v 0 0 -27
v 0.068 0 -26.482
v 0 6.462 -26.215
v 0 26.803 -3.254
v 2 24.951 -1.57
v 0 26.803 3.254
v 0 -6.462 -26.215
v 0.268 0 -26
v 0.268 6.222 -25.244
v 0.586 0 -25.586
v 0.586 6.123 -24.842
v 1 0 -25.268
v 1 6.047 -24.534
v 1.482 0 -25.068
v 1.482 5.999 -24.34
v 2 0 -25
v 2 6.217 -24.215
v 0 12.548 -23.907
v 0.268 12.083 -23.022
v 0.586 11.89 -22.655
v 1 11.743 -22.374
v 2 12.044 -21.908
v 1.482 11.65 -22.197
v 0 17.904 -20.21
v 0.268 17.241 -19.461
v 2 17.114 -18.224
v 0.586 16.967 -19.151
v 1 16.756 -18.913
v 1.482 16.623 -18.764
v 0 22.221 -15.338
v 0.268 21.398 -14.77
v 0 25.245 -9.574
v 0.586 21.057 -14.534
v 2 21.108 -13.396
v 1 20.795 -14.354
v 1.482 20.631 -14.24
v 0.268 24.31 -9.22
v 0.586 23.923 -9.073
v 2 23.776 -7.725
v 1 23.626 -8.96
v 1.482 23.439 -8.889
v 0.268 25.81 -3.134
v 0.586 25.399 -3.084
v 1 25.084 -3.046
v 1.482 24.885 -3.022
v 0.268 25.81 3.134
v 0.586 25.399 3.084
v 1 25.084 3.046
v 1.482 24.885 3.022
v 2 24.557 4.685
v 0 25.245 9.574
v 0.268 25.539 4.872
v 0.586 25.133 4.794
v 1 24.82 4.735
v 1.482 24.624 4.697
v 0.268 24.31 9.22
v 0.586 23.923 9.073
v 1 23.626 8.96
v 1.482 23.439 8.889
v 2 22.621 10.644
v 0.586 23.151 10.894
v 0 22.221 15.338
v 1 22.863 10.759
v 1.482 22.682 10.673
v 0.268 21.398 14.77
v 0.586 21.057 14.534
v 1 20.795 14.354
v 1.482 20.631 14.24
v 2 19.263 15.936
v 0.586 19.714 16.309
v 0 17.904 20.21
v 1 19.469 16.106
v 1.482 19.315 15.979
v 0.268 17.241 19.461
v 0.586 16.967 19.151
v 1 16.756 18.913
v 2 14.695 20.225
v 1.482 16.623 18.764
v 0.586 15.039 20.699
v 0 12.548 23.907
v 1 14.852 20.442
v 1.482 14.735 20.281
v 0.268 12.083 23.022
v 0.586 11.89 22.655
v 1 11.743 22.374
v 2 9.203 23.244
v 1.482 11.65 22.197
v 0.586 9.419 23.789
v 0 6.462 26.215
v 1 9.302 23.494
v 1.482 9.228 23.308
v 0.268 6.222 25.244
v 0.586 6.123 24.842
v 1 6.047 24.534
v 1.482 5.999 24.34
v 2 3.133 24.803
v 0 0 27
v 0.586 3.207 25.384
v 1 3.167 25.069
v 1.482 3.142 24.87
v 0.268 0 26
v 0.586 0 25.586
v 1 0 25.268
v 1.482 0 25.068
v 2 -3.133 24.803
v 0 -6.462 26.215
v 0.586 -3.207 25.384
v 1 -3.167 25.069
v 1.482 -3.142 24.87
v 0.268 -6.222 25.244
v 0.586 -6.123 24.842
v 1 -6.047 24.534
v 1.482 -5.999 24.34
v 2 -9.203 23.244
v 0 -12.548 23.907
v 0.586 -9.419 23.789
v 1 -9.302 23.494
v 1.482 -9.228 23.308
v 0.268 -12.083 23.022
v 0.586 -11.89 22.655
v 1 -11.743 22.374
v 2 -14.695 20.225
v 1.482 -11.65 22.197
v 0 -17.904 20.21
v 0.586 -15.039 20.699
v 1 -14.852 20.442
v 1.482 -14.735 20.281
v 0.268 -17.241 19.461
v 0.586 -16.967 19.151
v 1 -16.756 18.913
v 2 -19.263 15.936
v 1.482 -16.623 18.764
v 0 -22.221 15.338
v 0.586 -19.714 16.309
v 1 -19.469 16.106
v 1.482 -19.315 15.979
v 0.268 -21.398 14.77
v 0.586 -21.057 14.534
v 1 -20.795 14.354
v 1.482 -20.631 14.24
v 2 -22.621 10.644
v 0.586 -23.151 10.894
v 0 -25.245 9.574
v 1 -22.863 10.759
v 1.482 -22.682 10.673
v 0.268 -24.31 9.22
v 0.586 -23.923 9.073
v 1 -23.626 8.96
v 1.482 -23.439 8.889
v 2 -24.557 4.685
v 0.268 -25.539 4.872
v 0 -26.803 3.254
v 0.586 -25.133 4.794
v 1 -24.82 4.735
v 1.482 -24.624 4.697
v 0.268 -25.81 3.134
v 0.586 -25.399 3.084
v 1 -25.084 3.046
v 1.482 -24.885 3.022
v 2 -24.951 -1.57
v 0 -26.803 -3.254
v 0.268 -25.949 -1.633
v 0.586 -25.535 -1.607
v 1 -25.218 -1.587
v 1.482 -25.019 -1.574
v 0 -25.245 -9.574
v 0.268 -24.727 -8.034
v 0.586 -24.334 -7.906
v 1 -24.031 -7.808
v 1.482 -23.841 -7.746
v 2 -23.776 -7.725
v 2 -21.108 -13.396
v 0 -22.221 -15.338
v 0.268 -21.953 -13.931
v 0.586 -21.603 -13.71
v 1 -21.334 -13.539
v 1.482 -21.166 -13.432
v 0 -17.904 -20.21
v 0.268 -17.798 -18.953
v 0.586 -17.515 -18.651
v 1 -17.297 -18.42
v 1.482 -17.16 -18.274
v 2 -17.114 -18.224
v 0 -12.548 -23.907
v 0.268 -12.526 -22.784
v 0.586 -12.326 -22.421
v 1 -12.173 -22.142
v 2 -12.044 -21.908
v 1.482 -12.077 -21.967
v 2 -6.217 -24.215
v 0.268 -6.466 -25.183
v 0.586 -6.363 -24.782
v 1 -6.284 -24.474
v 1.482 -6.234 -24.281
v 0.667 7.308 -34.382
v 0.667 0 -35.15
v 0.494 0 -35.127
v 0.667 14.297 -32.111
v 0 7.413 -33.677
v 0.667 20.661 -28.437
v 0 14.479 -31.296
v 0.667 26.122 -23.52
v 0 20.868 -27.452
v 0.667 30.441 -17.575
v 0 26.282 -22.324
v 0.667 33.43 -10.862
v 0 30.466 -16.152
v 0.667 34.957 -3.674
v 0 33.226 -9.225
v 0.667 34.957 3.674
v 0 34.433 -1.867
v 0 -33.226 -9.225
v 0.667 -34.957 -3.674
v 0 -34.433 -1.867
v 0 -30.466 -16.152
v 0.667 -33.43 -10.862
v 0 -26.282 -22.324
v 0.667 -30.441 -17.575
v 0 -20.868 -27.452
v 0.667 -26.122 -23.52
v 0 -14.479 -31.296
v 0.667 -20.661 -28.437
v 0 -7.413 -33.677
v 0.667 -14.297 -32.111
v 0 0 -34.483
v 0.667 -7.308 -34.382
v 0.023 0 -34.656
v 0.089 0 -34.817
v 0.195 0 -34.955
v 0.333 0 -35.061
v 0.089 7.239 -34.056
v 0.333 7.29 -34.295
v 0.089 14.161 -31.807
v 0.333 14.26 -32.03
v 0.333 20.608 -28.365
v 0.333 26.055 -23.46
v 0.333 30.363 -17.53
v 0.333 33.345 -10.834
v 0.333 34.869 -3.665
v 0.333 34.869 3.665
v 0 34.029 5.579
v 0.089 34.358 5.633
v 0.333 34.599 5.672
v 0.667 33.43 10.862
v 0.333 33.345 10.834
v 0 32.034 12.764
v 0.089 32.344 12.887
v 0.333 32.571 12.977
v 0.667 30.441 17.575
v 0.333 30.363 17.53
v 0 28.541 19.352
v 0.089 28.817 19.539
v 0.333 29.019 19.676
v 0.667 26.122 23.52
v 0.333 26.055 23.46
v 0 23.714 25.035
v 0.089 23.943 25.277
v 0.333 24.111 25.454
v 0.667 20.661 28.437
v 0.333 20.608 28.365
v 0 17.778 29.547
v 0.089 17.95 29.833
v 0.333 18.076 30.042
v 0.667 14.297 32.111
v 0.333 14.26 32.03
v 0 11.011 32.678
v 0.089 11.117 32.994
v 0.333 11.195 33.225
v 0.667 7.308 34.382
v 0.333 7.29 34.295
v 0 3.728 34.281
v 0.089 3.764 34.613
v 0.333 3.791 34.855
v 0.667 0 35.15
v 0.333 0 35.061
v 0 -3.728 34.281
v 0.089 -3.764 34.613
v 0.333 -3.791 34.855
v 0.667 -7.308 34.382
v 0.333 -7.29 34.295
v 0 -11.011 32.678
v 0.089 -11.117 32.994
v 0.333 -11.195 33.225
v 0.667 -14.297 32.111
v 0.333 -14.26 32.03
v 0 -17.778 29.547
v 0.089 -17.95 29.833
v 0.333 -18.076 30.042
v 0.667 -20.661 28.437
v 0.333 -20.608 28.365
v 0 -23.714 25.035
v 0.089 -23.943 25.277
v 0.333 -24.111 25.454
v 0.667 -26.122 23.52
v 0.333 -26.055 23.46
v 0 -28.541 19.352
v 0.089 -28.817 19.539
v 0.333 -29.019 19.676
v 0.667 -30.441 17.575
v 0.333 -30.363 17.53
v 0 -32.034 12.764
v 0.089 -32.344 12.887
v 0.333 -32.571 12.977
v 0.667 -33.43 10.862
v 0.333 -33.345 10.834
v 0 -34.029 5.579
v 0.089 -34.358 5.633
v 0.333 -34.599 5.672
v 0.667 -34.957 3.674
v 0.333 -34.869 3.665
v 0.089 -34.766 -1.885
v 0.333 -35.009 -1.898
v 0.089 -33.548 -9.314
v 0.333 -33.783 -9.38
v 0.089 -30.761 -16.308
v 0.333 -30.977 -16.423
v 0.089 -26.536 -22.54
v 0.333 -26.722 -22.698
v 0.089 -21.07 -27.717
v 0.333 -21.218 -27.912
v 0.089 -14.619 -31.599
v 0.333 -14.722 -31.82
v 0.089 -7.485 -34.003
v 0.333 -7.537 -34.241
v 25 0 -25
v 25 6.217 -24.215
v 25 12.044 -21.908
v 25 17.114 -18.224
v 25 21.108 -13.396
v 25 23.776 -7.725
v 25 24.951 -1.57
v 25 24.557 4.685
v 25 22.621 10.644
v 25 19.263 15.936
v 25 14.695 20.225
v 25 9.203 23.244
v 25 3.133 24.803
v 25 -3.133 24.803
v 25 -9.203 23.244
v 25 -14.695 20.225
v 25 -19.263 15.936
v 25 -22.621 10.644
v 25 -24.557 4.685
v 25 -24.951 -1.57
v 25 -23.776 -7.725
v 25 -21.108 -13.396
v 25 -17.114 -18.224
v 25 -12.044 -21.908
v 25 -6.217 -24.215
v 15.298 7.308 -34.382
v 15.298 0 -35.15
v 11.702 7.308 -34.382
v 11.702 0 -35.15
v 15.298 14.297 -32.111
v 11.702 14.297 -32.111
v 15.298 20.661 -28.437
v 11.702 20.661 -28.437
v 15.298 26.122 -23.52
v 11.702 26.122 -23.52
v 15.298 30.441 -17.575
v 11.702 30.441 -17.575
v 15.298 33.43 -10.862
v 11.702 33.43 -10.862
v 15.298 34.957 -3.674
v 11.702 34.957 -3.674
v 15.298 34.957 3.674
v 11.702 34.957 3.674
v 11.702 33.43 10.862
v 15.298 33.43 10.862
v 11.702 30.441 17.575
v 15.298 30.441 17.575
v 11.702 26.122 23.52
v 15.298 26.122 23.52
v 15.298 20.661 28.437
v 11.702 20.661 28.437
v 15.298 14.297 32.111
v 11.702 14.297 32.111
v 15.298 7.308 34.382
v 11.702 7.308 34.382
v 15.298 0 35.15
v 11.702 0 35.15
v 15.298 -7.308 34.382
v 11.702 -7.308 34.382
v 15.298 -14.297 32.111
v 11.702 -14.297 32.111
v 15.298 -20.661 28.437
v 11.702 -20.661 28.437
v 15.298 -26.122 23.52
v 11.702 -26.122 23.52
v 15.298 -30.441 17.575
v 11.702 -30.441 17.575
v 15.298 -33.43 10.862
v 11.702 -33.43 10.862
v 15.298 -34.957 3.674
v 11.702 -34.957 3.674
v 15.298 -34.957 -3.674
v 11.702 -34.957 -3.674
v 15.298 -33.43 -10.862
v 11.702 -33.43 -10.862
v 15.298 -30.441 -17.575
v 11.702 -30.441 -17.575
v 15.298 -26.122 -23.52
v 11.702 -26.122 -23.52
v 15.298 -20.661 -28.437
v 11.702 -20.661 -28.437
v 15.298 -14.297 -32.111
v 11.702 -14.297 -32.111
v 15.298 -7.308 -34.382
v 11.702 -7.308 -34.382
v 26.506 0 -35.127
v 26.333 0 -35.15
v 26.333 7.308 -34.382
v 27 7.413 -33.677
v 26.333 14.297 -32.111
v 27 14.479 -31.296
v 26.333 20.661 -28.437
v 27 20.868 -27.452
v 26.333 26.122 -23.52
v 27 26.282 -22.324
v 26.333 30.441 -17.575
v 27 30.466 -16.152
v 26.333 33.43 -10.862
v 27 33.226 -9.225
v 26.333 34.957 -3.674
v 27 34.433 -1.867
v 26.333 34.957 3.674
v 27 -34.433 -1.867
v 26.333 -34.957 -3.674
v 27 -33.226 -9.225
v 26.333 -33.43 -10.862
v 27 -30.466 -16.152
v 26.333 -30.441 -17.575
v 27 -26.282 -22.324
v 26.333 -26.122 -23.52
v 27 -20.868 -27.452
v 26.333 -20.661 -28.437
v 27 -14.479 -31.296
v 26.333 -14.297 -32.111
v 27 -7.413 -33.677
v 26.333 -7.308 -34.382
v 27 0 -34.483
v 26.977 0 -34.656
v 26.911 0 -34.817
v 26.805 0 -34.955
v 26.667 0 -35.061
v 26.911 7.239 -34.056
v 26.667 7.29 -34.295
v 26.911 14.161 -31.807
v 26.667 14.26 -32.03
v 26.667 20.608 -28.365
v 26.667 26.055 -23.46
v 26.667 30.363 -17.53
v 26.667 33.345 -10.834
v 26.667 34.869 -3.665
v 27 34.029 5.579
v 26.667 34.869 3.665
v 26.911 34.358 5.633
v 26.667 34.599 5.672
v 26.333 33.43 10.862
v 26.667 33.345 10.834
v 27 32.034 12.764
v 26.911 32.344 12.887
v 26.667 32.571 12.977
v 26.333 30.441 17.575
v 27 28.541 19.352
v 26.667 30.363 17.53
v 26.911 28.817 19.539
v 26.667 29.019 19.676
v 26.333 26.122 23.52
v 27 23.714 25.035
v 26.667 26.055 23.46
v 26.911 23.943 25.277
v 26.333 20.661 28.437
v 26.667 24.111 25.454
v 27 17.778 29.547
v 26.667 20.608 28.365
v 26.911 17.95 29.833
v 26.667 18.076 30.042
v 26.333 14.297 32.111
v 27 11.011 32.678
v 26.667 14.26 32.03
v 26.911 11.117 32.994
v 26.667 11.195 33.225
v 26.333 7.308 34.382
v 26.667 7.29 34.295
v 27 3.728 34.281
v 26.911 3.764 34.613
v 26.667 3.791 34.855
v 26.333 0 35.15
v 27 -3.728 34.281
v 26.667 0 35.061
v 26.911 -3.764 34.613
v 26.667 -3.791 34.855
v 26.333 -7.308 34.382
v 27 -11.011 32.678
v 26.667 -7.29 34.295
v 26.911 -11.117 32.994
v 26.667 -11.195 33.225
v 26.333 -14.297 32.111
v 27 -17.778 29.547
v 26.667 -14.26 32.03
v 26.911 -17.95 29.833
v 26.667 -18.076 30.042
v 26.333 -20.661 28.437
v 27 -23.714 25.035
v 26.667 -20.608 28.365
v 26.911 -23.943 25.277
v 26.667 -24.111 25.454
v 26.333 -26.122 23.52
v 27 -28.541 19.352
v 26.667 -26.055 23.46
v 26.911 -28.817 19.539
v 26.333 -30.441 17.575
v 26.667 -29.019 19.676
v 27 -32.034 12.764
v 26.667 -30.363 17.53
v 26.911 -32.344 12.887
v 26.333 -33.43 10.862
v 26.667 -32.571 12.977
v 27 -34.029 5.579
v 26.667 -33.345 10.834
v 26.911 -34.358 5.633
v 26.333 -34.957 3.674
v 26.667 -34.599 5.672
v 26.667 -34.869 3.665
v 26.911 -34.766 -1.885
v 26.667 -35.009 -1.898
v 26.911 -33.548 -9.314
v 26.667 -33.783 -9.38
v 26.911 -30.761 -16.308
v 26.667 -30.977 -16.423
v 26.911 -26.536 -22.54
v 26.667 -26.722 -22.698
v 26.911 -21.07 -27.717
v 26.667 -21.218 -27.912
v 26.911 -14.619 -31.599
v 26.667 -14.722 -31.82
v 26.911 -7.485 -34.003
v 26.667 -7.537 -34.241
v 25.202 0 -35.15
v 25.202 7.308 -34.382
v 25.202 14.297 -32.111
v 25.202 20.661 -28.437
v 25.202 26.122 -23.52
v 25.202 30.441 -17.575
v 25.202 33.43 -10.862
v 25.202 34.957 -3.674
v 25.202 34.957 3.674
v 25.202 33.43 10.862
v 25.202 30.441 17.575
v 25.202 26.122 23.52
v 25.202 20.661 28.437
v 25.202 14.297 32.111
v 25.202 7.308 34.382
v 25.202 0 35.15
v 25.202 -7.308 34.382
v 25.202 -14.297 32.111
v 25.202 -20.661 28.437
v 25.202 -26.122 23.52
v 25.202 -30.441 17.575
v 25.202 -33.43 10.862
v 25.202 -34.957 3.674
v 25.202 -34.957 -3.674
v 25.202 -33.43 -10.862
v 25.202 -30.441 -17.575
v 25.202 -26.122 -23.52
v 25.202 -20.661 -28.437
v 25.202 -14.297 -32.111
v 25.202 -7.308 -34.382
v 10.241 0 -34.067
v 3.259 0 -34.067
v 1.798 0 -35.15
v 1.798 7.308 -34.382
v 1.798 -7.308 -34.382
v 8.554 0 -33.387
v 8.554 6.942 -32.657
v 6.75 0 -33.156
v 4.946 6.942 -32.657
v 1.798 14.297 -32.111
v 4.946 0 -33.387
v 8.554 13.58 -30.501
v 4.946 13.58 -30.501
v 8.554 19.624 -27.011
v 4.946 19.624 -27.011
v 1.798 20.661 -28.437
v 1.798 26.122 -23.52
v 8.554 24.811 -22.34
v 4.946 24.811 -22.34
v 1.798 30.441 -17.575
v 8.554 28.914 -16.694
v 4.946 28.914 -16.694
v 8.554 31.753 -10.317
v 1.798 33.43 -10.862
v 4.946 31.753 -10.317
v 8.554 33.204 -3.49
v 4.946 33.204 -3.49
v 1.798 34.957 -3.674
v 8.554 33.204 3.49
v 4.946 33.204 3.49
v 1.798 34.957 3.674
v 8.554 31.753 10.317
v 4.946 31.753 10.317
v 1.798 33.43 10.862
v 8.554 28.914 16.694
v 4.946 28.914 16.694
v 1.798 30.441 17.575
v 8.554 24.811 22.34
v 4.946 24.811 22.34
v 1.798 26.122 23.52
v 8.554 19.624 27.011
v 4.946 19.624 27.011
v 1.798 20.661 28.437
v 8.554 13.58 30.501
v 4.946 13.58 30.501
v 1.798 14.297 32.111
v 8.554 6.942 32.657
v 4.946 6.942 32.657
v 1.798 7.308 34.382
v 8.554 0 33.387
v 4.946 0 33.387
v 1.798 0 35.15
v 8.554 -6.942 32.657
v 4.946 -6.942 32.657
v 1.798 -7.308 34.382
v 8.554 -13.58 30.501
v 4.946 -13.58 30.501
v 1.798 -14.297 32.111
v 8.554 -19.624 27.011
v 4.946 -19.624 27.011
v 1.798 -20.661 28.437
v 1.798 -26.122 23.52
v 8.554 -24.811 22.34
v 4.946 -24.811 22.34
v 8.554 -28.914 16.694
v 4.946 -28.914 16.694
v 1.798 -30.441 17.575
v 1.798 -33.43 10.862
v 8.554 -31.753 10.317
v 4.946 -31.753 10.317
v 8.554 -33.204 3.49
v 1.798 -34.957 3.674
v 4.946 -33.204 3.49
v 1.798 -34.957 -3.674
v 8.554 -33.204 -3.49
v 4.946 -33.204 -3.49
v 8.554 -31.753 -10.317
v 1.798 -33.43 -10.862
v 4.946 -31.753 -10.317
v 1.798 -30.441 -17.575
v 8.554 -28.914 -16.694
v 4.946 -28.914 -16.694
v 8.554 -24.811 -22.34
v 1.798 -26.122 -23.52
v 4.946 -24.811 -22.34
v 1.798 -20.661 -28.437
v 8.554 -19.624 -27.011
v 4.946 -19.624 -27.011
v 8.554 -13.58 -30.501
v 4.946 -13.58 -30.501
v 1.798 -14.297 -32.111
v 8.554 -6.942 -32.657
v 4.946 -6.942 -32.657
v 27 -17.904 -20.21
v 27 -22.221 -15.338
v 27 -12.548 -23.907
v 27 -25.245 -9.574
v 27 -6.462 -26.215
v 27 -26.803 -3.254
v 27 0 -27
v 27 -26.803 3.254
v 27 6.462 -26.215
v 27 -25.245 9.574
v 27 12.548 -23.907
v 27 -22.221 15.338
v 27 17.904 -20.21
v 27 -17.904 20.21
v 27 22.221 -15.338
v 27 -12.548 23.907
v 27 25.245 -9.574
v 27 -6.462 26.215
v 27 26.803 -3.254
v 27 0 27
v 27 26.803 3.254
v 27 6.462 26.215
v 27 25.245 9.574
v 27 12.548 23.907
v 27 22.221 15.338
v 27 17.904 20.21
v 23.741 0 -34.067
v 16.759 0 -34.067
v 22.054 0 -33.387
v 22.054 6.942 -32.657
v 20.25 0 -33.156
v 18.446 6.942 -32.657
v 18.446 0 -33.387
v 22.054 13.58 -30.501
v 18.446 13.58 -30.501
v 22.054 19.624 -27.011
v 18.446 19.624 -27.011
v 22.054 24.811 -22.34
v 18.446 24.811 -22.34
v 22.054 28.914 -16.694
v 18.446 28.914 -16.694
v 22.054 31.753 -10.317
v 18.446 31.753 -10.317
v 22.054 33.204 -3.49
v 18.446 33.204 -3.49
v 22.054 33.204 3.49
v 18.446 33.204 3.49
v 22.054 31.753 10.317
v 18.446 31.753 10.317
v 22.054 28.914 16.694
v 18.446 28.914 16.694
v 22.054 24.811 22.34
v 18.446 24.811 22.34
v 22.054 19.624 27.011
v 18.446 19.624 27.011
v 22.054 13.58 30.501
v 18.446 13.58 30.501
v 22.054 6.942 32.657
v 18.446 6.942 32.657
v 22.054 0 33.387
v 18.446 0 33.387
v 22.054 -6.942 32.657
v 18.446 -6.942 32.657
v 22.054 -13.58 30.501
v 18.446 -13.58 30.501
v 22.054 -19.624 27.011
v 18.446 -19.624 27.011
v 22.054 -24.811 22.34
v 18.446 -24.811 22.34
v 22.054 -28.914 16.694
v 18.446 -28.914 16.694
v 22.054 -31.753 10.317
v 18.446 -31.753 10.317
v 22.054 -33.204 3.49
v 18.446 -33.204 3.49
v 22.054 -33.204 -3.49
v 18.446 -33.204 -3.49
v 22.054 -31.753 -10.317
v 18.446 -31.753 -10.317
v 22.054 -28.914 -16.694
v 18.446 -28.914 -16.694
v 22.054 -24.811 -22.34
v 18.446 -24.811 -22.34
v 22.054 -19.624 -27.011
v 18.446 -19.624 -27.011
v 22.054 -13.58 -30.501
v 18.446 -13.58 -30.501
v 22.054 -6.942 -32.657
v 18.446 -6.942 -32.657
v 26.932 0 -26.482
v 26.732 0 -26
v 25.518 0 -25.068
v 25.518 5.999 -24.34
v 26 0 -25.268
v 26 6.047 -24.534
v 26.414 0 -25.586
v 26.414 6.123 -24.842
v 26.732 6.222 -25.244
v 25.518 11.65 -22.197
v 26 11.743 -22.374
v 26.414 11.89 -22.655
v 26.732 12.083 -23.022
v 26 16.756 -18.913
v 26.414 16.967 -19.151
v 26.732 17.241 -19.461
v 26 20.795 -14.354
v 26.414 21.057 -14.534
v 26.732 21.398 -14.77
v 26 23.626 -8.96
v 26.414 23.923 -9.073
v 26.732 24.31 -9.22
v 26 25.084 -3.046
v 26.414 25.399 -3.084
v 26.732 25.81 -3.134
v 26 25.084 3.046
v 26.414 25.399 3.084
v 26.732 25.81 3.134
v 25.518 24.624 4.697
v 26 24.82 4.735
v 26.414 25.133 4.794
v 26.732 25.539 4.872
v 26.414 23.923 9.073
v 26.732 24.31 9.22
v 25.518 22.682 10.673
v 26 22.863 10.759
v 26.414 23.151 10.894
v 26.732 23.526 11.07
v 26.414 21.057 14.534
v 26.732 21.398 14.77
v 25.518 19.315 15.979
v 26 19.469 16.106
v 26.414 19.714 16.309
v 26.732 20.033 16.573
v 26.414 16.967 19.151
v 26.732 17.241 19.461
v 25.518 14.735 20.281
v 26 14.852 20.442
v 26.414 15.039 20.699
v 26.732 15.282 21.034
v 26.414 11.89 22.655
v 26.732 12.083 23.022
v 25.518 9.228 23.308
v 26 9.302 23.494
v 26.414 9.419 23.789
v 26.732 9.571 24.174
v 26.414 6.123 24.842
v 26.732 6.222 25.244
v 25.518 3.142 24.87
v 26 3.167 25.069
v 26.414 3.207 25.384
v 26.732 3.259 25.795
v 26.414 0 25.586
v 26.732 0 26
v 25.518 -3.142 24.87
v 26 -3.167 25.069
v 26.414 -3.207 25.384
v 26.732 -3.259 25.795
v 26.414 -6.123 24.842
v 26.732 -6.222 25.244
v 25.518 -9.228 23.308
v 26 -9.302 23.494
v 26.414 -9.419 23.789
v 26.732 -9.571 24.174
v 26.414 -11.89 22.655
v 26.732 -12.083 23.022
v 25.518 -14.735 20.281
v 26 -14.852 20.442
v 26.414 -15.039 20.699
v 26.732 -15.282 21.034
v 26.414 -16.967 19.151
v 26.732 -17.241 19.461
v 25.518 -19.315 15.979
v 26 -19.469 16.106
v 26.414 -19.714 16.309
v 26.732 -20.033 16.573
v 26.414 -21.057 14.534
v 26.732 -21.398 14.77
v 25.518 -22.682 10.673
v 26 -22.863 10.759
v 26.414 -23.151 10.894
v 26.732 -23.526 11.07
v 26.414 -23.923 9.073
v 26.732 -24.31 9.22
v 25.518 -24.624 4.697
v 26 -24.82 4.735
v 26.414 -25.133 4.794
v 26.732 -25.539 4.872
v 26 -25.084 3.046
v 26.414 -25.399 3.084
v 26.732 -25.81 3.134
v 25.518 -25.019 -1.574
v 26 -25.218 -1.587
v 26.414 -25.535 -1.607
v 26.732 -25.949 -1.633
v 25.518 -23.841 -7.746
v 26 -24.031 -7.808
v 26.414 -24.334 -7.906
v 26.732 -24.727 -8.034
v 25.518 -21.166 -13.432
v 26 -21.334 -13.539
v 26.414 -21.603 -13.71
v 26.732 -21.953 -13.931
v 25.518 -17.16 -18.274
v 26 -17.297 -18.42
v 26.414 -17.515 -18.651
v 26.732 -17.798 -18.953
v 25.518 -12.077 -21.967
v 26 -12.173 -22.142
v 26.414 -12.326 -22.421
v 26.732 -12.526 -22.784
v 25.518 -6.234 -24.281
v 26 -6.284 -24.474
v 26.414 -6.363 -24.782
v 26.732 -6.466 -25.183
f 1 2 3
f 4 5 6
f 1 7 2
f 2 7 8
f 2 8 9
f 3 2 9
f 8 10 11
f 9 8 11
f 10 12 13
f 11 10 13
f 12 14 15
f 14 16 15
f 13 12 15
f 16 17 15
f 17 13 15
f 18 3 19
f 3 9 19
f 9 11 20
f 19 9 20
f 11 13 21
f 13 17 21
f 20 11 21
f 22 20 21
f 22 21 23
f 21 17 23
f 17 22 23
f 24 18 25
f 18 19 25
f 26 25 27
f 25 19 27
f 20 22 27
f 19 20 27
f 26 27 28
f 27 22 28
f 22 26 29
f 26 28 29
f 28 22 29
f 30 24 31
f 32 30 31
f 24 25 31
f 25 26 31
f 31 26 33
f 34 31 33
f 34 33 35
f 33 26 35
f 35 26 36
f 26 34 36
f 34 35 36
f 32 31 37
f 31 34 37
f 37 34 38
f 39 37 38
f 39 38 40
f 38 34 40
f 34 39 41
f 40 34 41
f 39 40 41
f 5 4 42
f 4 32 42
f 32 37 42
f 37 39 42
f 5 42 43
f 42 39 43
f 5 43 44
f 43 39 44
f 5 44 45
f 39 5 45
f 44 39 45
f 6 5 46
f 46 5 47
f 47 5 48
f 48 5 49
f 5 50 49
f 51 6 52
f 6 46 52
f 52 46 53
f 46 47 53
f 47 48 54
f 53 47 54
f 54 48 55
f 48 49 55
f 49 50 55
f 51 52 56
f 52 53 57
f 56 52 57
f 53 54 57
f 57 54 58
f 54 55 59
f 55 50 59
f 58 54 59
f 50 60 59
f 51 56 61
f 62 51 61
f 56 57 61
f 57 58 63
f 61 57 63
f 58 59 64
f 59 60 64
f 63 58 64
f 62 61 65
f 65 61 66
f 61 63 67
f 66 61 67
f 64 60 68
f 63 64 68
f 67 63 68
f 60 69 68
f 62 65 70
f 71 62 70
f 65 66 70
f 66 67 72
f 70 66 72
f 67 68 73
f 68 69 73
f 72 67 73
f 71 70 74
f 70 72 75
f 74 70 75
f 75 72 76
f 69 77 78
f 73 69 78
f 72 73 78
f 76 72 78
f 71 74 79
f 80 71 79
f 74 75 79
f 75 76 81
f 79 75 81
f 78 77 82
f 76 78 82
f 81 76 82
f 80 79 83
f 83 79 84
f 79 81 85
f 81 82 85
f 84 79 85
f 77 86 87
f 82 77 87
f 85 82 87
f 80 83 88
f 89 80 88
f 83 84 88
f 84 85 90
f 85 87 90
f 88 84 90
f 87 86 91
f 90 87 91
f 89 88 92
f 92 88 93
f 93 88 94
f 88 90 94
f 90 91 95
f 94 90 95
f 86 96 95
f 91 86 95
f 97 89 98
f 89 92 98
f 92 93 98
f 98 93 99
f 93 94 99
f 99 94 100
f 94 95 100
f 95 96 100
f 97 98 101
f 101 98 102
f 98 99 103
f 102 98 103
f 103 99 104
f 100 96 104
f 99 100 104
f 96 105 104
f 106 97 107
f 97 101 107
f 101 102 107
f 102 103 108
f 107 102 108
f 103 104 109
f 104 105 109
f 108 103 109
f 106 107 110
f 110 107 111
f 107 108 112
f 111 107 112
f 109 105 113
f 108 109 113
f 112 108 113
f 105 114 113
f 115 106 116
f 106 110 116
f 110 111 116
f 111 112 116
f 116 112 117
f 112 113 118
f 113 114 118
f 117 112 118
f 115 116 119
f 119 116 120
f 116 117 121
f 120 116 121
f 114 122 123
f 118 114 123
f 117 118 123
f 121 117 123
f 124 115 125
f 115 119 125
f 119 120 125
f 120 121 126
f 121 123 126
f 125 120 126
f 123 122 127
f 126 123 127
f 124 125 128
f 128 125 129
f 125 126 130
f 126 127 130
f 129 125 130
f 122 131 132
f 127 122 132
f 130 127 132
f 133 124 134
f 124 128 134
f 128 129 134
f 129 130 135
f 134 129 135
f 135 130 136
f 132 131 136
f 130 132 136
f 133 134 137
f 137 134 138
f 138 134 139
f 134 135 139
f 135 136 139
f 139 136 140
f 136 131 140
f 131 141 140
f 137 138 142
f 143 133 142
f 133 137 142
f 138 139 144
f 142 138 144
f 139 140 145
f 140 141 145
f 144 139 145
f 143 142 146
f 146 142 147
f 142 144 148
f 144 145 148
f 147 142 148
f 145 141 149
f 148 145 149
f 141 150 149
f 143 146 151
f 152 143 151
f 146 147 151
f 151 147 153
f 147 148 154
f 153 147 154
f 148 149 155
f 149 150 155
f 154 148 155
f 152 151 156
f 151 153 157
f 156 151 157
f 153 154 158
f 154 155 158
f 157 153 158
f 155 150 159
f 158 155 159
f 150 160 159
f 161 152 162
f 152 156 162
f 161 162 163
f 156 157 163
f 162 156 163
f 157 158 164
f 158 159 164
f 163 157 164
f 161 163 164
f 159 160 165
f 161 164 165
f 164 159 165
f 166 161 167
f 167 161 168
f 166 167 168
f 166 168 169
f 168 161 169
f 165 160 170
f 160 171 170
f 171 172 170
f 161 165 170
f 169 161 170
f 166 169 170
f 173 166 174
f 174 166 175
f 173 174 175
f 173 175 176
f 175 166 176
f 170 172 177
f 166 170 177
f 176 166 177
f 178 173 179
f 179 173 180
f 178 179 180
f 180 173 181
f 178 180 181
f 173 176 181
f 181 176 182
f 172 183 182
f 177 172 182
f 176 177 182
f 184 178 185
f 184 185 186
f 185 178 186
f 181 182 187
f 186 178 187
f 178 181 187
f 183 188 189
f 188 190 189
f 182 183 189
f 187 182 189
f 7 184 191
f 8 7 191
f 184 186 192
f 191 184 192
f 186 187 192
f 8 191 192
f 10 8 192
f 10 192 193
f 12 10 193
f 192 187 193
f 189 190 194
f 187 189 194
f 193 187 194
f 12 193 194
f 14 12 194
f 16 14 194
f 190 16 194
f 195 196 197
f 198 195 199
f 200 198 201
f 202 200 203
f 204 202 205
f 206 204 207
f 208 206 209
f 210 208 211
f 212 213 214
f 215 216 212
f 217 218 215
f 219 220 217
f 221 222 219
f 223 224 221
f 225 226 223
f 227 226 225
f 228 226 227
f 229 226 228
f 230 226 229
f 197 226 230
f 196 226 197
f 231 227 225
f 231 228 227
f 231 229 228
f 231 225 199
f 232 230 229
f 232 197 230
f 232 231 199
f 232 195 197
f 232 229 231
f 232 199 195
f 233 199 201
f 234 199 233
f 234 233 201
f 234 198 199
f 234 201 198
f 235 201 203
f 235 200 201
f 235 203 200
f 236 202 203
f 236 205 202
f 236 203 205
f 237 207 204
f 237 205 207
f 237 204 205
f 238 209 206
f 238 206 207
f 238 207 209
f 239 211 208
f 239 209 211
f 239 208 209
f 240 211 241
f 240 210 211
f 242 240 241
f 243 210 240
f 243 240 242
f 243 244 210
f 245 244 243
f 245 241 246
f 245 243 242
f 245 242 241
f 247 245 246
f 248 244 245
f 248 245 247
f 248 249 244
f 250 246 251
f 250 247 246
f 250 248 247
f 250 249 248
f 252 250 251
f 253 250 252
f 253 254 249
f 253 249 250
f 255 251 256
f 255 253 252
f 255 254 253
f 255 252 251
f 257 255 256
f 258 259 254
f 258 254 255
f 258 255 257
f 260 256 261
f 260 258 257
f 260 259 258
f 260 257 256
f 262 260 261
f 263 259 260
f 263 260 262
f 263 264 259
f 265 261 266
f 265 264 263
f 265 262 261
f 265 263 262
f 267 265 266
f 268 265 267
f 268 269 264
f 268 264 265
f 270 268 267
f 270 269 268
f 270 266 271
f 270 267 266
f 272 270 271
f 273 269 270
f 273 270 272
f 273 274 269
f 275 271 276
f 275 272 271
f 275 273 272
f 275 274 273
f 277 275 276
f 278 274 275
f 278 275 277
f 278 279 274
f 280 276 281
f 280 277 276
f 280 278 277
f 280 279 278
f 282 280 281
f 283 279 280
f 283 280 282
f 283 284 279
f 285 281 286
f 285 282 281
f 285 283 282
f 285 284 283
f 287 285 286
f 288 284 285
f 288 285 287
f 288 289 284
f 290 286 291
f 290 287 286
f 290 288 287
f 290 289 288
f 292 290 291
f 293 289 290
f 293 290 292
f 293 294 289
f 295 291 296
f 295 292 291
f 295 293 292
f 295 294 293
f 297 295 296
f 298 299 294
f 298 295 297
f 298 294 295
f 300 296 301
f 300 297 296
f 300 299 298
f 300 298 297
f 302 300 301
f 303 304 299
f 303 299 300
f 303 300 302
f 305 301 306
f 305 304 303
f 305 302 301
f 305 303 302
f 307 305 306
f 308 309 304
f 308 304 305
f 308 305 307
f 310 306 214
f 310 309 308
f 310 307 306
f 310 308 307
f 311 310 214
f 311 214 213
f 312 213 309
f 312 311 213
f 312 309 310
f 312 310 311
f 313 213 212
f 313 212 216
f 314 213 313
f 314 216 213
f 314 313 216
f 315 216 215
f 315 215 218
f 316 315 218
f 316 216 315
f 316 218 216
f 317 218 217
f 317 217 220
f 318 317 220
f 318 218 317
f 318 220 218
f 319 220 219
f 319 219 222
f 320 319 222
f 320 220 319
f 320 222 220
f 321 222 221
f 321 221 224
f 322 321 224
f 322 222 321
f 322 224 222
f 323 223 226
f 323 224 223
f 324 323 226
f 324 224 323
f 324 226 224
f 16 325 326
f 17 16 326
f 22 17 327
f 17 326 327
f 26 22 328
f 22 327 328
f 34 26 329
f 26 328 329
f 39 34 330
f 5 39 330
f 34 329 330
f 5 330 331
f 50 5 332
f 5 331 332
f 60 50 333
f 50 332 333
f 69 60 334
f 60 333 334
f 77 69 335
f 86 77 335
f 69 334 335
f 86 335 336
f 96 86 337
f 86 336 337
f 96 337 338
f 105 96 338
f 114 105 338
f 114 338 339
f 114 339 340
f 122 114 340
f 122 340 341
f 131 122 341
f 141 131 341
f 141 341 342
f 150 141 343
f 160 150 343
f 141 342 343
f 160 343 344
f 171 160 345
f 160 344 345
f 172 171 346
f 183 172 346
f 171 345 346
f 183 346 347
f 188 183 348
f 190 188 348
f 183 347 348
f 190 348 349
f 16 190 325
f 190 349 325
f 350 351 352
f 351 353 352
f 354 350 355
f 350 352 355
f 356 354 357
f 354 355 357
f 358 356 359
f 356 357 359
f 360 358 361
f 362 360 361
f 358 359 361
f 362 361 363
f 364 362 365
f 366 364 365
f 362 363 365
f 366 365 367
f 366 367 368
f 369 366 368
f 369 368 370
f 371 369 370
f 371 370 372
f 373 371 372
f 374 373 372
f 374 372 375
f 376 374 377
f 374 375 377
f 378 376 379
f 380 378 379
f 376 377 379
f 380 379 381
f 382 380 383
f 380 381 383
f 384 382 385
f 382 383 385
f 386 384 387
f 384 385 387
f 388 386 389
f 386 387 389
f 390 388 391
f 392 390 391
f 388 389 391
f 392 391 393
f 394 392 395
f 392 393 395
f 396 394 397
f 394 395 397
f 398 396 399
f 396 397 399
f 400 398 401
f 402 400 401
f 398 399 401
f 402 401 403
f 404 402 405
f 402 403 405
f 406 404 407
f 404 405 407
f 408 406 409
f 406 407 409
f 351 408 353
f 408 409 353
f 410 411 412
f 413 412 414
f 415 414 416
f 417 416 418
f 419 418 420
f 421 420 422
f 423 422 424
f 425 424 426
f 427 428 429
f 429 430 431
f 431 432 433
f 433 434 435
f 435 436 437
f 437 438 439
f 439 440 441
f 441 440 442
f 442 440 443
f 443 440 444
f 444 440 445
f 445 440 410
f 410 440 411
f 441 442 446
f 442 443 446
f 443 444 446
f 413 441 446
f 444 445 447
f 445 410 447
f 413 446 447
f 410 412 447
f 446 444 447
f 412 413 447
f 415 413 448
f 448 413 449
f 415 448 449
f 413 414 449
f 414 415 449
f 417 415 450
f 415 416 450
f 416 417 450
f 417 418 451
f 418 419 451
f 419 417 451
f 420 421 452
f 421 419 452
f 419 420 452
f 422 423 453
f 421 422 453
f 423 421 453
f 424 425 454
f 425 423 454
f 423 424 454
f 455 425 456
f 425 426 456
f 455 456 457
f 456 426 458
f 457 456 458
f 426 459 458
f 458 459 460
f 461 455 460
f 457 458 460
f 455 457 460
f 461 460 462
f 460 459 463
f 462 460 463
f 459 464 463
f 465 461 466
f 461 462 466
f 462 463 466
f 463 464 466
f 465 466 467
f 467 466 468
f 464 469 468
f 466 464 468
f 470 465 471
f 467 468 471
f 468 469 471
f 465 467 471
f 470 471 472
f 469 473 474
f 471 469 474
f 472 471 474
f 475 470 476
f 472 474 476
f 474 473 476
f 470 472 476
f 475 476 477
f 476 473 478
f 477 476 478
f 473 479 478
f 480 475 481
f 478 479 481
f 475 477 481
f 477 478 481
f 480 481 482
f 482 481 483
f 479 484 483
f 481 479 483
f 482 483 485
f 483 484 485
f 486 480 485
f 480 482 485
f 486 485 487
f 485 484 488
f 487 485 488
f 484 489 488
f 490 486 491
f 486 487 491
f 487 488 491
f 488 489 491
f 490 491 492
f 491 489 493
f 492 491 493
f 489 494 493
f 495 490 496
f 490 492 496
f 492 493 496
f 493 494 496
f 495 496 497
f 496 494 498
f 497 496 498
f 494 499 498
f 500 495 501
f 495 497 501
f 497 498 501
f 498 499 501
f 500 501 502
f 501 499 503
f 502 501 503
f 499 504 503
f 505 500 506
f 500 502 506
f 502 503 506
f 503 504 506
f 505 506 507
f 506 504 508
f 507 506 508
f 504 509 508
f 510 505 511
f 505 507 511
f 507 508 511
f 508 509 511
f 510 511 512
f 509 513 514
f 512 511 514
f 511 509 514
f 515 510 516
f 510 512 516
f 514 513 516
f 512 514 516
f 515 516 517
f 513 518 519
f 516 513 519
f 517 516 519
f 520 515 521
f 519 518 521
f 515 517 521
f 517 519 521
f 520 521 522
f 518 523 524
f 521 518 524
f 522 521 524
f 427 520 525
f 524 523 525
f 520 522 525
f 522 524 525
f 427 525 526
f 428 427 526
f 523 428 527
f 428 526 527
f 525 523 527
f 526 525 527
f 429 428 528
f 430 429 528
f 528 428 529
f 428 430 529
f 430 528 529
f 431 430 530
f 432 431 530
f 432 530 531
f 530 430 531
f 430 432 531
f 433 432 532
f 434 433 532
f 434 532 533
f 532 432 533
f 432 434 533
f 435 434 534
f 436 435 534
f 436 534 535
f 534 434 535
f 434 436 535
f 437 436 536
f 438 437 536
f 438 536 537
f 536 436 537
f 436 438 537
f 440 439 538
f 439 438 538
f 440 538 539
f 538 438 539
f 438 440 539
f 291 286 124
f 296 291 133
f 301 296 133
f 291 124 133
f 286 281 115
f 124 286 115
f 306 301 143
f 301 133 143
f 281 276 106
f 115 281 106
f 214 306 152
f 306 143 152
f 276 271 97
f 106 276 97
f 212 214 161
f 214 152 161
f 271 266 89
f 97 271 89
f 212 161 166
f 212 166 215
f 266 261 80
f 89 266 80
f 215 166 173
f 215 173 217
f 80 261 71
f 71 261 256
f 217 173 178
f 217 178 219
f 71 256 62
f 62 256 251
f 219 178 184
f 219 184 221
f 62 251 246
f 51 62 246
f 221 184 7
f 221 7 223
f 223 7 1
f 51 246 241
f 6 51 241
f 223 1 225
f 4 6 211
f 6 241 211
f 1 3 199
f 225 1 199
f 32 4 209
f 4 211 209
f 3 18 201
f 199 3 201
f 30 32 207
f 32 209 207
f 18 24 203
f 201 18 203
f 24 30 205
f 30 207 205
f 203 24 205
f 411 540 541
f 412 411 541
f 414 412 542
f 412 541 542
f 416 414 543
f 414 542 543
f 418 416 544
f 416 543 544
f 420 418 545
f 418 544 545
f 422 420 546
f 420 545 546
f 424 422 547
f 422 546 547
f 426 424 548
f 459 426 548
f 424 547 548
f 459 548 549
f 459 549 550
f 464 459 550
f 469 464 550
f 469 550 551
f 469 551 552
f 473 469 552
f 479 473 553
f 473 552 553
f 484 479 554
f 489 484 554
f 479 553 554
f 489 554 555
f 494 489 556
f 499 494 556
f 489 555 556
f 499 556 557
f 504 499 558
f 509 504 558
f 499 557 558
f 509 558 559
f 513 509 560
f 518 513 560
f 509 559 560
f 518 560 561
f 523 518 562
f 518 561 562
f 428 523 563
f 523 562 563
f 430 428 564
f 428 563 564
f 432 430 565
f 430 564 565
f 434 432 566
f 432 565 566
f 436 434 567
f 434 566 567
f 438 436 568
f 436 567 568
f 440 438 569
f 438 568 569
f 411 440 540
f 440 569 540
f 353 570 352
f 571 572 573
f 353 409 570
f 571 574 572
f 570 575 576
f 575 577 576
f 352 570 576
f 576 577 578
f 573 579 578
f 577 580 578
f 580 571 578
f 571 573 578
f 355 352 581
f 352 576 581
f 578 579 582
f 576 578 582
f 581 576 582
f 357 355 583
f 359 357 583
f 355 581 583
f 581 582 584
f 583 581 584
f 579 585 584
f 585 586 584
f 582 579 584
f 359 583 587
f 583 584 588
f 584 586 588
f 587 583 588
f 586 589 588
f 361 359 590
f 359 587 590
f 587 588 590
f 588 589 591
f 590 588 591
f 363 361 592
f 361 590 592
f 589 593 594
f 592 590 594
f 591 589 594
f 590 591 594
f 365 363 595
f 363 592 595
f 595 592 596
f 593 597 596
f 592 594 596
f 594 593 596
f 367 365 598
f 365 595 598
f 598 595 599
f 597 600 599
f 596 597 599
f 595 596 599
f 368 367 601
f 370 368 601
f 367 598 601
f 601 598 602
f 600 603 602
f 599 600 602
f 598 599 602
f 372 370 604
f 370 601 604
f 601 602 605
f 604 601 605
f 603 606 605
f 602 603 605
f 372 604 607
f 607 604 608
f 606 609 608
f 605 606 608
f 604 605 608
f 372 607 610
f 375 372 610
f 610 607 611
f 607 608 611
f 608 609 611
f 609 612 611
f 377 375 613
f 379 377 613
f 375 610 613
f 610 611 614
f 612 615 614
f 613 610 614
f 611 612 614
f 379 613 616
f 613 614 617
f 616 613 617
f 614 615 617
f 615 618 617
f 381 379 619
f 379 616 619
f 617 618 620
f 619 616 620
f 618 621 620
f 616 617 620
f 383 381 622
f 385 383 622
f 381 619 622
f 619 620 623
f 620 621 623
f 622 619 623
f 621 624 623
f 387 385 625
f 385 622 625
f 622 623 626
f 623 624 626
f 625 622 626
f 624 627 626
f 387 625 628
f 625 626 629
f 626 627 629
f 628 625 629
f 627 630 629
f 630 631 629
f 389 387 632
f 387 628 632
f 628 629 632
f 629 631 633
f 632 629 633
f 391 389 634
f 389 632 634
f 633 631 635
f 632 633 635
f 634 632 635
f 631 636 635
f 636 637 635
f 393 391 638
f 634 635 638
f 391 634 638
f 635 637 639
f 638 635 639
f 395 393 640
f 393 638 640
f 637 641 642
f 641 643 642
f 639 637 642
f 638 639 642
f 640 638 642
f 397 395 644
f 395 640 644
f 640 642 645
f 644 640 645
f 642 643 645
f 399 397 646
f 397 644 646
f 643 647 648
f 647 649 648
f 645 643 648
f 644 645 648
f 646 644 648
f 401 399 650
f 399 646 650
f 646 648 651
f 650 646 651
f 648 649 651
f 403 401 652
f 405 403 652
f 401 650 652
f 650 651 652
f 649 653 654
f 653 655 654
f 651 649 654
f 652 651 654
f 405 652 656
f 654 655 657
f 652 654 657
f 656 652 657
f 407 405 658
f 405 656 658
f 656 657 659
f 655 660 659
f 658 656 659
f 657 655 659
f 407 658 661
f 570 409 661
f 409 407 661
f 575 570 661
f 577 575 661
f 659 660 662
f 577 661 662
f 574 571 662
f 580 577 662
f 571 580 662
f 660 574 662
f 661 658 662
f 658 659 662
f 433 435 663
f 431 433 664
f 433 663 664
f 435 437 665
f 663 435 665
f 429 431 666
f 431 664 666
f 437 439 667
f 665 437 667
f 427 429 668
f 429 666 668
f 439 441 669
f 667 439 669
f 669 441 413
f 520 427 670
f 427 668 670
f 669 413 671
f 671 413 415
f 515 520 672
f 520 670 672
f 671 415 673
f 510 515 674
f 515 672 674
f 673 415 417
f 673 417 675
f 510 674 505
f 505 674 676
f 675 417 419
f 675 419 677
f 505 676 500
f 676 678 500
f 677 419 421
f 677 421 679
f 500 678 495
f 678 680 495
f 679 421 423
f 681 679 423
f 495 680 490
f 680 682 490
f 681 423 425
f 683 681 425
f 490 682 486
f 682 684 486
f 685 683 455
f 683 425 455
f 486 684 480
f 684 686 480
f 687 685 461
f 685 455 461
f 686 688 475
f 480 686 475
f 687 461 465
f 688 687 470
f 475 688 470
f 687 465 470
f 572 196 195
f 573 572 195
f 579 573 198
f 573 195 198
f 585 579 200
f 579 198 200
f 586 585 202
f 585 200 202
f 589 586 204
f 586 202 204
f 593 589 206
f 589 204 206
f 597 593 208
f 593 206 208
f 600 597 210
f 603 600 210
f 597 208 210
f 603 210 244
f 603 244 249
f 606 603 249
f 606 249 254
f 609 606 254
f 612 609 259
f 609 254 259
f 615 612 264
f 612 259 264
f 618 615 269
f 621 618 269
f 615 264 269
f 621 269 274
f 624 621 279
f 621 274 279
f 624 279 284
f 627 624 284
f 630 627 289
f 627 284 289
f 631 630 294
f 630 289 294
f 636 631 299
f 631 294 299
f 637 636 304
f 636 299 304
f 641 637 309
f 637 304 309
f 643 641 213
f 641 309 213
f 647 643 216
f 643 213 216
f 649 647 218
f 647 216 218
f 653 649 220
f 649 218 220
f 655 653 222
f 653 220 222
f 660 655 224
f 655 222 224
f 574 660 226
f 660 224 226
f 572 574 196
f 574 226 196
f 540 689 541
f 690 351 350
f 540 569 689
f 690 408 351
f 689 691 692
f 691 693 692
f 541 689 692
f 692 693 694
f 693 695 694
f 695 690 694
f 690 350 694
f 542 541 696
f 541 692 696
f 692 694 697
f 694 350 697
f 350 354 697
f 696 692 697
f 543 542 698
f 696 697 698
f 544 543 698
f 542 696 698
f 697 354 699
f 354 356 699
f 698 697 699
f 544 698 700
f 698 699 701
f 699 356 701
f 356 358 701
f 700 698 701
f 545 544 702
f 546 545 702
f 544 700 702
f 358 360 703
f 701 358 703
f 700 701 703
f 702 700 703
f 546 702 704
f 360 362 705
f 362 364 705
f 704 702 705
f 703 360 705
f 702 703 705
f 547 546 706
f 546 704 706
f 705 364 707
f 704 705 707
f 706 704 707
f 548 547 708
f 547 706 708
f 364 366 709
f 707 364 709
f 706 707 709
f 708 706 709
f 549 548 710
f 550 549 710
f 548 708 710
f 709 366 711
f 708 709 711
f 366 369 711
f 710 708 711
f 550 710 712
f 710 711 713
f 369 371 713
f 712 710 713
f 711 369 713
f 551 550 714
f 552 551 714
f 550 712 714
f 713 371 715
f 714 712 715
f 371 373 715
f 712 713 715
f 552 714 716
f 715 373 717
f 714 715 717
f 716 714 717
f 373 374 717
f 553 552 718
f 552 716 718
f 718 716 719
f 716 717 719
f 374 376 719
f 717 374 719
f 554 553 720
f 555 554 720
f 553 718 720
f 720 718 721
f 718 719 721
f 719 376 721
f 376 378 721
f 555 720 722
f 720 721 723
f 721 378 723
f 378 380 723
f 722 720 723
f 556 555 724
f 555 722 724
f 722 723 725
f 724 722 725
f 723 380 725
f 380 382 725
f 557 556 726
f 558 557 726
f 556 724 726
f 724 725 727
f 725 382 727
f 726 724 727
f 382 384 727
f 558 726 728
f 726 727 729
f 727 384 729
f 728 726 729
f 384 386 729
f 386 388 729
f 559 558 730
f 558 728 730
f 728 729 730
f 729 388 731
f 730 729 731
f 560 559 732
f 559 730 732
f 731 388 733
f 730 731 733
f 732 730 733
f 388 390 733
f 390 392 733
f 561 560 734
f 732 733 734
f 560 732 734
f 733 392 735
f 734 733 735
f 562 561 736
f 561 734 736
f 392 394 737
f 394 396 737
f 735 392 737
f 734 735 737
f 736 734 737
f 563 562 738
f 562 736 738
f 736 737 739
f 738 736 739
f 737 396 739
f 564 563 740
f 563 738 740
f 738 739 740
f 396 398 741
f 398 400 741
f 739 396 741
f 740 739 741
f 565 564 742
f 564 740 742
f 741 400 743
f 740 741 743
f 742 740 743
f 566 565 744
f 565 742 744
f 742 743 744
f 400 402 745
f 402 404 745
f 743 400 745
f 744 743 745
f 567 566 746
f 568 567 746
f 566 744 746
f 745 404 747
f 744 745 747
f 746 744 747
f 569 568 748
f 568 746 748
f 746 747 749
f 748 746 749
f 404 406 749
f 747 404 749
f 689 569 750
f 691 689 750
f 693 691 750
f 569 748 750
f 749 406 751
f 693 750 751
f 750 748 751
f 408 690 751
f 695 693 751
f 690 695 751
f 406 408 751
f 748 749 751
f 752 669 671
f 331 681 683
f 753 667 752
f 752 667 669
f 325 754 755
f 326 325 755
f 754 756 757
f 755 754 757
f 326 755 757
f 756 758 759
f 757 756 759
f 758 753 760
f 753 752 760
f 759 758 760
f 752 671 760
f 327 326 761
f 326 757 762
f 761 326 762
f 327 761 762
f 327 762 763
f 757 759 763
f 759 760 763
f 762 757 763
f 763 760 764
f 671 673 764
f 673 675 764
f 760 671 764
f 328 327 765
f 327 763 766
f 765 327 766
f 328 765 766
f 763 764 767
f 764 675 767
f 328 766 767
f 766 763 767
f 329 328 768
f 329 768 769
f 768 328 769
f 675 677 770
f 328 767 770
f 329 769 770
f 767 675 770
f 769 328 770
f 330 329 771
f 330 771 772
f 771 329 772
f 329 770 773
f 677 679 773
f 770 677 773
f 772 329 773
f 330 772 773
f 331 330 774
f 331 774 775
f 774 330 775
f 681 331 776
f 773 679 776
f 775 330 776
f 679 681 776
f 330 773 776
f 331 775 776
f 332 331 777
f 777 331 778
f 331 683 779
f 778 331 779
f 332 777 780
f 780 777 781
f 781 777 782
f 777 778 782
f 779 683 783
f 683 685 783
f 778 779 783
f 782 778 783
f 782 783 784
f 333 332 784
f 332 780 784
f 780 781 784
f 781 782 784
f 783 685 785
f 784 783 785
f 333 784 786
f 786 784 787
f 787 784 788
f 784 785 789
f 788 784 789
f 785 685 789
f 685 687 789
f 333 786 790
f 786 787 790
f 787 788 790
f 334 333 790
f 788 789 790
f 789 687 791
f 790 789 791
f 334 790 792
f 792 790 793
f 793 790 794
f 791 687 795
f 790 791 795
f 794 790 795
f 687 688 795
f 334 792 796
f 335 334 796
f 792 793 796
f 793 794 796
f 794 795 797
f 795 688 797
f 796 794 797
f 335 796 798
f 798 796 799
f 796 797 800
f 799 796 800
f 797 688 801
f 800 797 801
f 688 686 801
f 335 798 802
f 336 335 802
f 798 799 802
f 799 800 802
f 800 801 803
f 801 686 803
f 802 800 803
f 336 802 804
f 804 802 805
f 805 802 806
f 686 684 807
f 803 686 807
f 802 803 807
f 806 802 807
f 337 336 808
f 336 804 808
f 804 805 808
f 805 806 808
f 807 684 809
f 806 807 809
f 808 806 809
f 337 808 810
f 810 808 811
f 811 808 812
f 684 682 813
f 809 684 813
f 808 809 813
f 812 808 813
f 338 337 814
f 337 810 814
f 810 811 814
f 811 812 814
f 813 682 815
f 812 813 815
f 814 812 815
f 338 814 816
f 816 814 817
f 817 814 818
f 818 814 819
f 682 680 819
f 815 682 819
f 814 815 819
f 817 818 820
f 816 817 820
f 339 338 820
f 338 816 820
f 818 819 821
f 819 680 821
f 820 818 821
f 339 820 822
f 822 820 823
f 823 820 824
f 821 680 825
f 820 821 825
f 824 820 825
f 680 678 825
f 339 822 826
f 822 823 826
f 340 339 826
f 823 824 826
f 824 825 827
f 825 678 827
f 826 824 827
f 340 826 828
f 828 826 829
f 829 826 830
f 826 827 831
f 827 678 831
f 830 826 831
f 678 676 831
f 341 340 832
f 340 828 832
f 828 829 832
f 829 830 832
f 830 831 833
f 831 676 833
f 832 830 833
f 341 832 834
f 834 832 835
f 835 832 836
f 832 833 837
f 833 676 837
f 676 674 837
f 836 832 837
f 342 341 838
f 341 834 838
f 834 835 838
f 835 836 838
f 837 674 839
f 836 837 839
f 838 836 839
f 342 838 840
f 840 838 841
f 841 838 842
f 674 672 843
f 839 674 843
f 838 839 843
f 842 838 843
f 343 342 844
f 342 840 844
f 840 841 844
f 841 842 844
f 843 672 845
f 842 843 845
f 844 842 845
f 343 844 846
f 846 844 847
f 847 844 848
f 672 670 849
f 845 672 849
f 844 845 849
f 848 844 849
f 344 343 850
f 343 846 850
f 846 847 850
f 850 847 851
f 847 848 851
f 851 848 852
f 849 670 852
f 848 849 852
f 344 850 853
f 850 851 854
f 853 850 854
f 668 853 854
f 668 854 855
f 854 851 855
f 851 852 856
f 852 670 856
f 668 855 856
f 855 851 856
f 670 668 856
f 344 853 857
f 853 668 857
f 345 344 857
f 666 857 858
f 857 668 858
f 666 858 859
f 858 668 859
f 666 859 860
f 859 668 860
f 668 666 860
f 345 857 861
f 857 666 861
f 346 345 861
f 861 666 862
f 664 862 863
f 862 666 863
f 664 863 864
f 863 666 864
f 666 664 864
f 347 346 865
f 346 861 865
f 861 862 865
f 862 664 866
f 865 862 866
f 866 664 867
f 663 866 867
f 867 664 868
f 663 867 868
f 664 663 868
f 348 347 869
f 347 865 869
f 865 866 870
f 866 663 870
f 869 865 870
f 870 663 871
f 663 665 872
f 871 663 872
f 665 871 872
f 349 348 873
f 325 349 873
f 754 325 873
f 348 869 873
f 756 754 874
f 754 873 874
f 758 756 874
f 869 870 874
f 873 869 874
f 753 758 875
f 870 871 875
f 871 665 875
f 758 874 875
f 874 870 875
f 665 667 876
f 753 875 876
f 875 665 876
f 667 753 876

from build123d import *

# Parameters (mm, degrees)
FILLET1_R = 2
FILLET2_R = 0.666666667


with BuildPart() as part:
    # Sketch1 → Revolve1 (revolve)
    with BuildSketch(Plane.XY, mode=Mode.PRIVATE) as revolve1_sk:
        with BuildLine():
            Line((1.798294662, 35.15), (0, 35.15))
            Line((0, 35.15), (0, 25))
            Line((0, 25), (27, 25))
            Line((27, 25), (27, 35.15))
            Line((27, 35.15), (25.201705338, 35.15))
            ThreePointArc((25.201705338, 35.15), (20.25, 33.1555), (15.298294662, 35.15))
            Line((15.298294662, 35.15), (11.701705338, 35.15))
            ThreePointArc((11.701705338, 35.15), (6.75, 33.1555), (1.798294662, 35.15))
        make_face()
    revolve(revolve1_sk.sketch.rotate(Axis((0, 0, 0), (1, 0, 0)), 270), axis=Axis((0, 0, 0), (1, 0, 0)))

    # Fillet1
    fillet1_edges = [part.edges().sort_by_distance(p)[0] for p in [
        (0, 0, 25),
        (27, 0, 25),
    ]]
    fillet(fillet1_edges, radius=FILLET1_R)

    # Fillet2
    fillet2_edges = [part.edges().sort_by_distance(p)[0] for p in [
        (0, 0, 35.15),
        (27, 0, 35.15),
    ]]
    fillet(fillet2_edges, radius=FILLET2_R)


solid = part.part
